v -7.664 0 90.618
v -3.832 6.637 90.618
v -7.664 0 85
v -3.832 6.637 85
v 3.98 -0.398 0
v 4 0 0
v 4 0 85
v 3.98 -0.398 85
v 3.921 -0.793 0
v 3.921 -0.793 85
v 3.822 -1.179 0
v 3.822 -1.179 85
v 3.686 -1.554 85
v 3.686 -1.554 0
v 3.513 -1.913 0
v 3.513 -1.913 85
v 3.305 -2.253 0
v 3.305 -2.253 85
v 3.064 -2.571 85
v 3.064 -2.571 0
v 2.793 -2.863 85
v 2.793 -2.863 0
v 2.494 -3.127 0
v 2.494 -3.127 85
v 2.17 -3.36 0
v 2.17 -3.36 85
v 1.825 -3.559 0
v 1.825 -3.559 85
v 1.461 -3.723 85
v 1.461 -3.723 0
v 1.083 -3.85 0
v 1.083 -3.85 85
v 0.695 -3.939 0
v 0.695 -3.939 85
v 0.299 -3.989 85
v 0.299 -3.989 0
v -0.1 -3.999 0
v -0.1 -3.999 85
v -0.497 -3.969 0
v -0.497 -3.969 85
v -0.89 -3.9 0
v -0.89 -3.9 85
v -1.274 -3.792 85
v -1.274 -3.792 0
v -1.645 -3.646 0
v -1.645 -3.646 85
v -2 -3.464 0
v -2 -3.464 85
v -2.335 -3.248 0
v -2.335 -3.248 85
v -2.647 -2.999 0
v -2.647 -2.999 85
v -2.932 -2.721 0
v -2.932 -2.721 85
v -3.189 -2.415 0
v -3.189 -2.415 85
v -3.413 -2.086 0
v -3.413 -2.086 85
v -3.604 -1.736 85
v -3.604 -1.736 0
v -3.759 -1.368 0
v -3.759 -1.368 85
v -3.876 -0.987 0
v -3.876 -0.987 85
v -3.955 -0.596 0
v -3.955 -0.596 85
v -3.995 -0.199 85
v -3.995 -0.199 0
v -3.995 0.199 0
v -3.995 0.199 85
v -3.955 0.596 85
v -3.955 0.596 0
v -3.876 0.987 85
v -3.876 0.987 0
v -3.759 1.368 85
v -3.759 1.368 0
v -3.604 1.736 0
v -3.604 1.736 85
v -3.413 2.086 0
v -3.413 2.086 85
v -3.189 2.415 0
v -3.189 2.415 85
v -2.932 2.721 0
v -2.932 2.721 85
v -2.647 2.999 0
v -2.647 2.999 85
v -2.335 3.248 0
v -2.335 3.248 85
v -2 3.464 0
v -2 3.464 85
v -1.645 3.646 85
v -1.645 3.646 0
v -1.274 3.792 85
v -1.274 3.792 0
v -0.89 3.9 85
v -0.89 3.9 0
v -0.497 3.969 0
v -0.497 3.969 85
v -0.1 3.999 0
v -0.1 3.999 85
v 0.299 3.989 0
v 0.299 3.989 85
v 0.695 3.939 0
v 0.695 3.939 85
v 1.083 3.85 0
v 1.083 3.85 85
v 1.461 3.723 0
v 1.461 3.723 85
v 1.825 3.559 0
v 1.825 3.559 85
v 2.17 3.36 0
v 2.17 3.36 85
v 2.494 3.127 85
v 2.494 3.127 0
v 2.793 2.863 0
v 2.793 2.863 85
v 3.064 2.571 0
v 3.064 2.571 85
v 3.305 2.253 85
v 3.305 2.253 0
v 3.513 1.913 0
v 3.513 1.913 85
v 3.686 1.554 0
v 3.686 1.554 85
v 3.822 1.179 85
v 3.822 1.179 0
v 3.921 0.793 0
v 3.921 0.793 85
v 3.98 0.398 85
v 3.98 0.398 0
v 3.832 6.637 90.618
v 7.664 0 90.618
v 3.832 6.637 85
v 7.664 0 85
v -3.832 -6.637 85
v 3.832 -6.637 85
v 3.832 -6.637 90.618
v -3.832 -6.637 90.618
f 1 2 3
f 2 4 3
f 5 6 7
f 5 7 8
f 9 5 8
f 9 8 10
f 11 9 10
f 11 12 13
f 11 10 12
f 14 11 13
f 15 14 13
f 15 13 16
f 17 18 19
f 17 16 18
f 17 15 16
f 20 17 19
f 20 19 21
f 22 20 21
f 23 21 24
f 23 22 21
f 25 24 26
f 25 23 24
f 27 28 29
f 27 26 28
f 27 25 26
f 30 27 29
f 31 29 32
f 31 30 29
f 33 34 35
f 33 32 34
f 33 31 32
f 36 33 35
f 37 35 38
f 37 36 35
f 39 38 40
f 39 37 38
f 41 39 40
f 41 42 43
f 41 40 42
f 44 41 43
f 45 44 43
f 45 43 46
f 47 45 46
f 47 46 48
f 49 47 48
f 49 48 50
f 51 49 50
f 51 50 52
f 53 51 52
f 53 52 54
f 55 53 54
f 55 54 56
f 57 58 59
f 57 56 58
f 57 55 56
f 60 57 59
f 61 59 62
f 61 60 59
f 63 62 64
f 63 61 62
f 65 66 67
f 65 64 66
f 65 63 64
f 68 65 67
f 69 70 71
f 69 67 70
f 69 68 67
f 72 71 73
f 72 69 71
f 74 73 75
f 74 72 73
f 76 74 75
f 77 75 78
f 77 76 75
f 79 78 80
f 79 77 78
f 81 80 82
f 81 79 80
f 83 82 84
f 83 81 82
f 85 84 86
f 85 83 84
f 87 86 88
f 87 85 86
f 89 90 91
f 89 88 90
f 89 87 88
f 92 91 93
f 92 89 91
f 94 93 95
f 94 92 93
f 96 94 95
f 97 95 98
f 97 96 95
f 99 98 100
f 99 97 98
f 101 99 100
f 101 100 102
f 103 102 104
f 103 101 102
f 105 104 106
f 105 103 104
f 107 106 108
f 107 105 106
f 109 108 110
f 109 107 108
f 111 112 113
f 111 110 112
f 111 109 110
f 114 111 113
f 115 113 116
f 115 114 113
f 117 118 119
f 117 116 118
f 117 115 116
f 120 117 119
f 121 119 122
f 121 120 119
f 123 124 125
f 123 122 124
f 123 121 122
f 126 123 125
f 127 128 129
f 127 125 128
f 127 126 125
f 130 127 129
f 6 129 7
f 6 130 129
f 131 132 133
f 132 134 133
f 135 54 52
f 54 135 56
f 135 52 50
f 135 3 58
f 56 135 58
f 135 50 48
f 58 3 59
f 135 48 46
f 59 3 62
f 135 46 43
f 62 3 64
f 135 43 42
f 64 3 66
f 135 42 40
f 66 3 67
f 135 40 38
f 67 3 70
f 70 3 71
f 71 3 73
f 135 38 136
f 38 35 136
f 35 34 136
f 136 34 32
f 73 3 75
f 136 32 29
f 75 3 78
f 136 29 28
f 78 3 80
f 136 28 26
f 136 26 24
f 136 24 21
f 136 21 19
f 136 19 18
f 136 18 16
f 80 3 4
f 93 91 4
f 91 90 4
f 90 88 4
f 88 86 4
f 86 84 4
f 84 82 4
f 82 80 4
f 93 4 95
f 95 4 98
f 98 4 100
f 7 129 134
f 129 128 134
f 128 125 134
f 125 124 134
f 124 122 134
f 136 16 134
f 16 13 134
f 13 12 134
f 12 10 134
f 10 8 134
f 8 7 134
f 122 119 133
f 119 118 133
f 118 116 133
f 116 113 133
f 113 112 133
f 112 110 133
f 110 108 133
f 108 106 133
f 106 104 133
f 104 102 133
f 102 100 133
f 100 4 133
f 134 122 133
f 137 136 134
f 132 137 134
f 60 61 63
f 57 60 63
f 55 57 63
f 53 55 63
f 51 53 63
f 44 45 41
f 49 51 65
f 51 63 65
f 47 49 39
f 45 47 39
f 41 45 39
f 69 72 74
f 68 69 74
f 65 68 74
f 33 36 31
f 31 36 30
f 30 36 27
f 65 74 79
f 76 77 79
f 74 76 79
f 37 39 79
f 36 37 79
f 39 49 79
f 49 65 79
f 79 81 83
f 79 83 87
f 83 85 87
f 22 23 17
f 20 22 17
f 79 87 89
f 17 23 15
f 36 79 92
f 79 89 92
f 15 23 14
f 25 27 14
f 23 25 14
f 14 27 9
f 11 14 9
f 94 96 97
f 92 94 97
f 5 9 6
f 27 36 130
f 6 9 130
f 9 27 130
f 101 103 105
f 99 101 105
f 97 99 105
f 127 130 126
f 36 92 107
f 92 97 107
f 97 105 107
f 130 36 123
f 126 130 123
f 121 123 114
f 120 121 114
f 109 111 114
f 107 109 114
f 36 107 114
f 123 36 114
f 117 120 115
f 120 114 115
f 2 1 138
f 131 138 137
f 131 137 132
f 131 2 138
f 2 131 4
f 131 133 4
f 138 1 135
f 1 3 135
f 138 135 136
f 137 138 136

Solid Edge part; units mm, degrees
sketch "Sketch1" plane through (0, 0, 0) normal (0, 0, 1) x (1, 0, 0)
  circle A0 centre (0, 0) radius 4
extrude "Protrusion1" add sketch "Sketch1" along normal blind 85
cosmetic_thread "Thread_1" size "M8" thread depth 20
sketch "Sketch2" plane through (0, 0, 85) normal (0, 0, 1) x (1, 0, 0)
  line L0 (-3.832, 6.6372) -> (-7.664, 0)
  line L1 (-7.664, 0) -> (-3.832, -6.6372)
  line L2 (-3.832, -6.6372) -> (3.832, -6.6372)
  line L3 (3.832, -6.6372) -> (7.664, 0)
  line L4 (7.664, 0) -> (3.832, 6.6372)
  line L5 (3.832, 6.6372) -> (-3.832, 6.6372)
extrude "ExtrudedProtrusion_3" add sketch "Sketch2" along normal blind 5.6175
properties material "Steel"
